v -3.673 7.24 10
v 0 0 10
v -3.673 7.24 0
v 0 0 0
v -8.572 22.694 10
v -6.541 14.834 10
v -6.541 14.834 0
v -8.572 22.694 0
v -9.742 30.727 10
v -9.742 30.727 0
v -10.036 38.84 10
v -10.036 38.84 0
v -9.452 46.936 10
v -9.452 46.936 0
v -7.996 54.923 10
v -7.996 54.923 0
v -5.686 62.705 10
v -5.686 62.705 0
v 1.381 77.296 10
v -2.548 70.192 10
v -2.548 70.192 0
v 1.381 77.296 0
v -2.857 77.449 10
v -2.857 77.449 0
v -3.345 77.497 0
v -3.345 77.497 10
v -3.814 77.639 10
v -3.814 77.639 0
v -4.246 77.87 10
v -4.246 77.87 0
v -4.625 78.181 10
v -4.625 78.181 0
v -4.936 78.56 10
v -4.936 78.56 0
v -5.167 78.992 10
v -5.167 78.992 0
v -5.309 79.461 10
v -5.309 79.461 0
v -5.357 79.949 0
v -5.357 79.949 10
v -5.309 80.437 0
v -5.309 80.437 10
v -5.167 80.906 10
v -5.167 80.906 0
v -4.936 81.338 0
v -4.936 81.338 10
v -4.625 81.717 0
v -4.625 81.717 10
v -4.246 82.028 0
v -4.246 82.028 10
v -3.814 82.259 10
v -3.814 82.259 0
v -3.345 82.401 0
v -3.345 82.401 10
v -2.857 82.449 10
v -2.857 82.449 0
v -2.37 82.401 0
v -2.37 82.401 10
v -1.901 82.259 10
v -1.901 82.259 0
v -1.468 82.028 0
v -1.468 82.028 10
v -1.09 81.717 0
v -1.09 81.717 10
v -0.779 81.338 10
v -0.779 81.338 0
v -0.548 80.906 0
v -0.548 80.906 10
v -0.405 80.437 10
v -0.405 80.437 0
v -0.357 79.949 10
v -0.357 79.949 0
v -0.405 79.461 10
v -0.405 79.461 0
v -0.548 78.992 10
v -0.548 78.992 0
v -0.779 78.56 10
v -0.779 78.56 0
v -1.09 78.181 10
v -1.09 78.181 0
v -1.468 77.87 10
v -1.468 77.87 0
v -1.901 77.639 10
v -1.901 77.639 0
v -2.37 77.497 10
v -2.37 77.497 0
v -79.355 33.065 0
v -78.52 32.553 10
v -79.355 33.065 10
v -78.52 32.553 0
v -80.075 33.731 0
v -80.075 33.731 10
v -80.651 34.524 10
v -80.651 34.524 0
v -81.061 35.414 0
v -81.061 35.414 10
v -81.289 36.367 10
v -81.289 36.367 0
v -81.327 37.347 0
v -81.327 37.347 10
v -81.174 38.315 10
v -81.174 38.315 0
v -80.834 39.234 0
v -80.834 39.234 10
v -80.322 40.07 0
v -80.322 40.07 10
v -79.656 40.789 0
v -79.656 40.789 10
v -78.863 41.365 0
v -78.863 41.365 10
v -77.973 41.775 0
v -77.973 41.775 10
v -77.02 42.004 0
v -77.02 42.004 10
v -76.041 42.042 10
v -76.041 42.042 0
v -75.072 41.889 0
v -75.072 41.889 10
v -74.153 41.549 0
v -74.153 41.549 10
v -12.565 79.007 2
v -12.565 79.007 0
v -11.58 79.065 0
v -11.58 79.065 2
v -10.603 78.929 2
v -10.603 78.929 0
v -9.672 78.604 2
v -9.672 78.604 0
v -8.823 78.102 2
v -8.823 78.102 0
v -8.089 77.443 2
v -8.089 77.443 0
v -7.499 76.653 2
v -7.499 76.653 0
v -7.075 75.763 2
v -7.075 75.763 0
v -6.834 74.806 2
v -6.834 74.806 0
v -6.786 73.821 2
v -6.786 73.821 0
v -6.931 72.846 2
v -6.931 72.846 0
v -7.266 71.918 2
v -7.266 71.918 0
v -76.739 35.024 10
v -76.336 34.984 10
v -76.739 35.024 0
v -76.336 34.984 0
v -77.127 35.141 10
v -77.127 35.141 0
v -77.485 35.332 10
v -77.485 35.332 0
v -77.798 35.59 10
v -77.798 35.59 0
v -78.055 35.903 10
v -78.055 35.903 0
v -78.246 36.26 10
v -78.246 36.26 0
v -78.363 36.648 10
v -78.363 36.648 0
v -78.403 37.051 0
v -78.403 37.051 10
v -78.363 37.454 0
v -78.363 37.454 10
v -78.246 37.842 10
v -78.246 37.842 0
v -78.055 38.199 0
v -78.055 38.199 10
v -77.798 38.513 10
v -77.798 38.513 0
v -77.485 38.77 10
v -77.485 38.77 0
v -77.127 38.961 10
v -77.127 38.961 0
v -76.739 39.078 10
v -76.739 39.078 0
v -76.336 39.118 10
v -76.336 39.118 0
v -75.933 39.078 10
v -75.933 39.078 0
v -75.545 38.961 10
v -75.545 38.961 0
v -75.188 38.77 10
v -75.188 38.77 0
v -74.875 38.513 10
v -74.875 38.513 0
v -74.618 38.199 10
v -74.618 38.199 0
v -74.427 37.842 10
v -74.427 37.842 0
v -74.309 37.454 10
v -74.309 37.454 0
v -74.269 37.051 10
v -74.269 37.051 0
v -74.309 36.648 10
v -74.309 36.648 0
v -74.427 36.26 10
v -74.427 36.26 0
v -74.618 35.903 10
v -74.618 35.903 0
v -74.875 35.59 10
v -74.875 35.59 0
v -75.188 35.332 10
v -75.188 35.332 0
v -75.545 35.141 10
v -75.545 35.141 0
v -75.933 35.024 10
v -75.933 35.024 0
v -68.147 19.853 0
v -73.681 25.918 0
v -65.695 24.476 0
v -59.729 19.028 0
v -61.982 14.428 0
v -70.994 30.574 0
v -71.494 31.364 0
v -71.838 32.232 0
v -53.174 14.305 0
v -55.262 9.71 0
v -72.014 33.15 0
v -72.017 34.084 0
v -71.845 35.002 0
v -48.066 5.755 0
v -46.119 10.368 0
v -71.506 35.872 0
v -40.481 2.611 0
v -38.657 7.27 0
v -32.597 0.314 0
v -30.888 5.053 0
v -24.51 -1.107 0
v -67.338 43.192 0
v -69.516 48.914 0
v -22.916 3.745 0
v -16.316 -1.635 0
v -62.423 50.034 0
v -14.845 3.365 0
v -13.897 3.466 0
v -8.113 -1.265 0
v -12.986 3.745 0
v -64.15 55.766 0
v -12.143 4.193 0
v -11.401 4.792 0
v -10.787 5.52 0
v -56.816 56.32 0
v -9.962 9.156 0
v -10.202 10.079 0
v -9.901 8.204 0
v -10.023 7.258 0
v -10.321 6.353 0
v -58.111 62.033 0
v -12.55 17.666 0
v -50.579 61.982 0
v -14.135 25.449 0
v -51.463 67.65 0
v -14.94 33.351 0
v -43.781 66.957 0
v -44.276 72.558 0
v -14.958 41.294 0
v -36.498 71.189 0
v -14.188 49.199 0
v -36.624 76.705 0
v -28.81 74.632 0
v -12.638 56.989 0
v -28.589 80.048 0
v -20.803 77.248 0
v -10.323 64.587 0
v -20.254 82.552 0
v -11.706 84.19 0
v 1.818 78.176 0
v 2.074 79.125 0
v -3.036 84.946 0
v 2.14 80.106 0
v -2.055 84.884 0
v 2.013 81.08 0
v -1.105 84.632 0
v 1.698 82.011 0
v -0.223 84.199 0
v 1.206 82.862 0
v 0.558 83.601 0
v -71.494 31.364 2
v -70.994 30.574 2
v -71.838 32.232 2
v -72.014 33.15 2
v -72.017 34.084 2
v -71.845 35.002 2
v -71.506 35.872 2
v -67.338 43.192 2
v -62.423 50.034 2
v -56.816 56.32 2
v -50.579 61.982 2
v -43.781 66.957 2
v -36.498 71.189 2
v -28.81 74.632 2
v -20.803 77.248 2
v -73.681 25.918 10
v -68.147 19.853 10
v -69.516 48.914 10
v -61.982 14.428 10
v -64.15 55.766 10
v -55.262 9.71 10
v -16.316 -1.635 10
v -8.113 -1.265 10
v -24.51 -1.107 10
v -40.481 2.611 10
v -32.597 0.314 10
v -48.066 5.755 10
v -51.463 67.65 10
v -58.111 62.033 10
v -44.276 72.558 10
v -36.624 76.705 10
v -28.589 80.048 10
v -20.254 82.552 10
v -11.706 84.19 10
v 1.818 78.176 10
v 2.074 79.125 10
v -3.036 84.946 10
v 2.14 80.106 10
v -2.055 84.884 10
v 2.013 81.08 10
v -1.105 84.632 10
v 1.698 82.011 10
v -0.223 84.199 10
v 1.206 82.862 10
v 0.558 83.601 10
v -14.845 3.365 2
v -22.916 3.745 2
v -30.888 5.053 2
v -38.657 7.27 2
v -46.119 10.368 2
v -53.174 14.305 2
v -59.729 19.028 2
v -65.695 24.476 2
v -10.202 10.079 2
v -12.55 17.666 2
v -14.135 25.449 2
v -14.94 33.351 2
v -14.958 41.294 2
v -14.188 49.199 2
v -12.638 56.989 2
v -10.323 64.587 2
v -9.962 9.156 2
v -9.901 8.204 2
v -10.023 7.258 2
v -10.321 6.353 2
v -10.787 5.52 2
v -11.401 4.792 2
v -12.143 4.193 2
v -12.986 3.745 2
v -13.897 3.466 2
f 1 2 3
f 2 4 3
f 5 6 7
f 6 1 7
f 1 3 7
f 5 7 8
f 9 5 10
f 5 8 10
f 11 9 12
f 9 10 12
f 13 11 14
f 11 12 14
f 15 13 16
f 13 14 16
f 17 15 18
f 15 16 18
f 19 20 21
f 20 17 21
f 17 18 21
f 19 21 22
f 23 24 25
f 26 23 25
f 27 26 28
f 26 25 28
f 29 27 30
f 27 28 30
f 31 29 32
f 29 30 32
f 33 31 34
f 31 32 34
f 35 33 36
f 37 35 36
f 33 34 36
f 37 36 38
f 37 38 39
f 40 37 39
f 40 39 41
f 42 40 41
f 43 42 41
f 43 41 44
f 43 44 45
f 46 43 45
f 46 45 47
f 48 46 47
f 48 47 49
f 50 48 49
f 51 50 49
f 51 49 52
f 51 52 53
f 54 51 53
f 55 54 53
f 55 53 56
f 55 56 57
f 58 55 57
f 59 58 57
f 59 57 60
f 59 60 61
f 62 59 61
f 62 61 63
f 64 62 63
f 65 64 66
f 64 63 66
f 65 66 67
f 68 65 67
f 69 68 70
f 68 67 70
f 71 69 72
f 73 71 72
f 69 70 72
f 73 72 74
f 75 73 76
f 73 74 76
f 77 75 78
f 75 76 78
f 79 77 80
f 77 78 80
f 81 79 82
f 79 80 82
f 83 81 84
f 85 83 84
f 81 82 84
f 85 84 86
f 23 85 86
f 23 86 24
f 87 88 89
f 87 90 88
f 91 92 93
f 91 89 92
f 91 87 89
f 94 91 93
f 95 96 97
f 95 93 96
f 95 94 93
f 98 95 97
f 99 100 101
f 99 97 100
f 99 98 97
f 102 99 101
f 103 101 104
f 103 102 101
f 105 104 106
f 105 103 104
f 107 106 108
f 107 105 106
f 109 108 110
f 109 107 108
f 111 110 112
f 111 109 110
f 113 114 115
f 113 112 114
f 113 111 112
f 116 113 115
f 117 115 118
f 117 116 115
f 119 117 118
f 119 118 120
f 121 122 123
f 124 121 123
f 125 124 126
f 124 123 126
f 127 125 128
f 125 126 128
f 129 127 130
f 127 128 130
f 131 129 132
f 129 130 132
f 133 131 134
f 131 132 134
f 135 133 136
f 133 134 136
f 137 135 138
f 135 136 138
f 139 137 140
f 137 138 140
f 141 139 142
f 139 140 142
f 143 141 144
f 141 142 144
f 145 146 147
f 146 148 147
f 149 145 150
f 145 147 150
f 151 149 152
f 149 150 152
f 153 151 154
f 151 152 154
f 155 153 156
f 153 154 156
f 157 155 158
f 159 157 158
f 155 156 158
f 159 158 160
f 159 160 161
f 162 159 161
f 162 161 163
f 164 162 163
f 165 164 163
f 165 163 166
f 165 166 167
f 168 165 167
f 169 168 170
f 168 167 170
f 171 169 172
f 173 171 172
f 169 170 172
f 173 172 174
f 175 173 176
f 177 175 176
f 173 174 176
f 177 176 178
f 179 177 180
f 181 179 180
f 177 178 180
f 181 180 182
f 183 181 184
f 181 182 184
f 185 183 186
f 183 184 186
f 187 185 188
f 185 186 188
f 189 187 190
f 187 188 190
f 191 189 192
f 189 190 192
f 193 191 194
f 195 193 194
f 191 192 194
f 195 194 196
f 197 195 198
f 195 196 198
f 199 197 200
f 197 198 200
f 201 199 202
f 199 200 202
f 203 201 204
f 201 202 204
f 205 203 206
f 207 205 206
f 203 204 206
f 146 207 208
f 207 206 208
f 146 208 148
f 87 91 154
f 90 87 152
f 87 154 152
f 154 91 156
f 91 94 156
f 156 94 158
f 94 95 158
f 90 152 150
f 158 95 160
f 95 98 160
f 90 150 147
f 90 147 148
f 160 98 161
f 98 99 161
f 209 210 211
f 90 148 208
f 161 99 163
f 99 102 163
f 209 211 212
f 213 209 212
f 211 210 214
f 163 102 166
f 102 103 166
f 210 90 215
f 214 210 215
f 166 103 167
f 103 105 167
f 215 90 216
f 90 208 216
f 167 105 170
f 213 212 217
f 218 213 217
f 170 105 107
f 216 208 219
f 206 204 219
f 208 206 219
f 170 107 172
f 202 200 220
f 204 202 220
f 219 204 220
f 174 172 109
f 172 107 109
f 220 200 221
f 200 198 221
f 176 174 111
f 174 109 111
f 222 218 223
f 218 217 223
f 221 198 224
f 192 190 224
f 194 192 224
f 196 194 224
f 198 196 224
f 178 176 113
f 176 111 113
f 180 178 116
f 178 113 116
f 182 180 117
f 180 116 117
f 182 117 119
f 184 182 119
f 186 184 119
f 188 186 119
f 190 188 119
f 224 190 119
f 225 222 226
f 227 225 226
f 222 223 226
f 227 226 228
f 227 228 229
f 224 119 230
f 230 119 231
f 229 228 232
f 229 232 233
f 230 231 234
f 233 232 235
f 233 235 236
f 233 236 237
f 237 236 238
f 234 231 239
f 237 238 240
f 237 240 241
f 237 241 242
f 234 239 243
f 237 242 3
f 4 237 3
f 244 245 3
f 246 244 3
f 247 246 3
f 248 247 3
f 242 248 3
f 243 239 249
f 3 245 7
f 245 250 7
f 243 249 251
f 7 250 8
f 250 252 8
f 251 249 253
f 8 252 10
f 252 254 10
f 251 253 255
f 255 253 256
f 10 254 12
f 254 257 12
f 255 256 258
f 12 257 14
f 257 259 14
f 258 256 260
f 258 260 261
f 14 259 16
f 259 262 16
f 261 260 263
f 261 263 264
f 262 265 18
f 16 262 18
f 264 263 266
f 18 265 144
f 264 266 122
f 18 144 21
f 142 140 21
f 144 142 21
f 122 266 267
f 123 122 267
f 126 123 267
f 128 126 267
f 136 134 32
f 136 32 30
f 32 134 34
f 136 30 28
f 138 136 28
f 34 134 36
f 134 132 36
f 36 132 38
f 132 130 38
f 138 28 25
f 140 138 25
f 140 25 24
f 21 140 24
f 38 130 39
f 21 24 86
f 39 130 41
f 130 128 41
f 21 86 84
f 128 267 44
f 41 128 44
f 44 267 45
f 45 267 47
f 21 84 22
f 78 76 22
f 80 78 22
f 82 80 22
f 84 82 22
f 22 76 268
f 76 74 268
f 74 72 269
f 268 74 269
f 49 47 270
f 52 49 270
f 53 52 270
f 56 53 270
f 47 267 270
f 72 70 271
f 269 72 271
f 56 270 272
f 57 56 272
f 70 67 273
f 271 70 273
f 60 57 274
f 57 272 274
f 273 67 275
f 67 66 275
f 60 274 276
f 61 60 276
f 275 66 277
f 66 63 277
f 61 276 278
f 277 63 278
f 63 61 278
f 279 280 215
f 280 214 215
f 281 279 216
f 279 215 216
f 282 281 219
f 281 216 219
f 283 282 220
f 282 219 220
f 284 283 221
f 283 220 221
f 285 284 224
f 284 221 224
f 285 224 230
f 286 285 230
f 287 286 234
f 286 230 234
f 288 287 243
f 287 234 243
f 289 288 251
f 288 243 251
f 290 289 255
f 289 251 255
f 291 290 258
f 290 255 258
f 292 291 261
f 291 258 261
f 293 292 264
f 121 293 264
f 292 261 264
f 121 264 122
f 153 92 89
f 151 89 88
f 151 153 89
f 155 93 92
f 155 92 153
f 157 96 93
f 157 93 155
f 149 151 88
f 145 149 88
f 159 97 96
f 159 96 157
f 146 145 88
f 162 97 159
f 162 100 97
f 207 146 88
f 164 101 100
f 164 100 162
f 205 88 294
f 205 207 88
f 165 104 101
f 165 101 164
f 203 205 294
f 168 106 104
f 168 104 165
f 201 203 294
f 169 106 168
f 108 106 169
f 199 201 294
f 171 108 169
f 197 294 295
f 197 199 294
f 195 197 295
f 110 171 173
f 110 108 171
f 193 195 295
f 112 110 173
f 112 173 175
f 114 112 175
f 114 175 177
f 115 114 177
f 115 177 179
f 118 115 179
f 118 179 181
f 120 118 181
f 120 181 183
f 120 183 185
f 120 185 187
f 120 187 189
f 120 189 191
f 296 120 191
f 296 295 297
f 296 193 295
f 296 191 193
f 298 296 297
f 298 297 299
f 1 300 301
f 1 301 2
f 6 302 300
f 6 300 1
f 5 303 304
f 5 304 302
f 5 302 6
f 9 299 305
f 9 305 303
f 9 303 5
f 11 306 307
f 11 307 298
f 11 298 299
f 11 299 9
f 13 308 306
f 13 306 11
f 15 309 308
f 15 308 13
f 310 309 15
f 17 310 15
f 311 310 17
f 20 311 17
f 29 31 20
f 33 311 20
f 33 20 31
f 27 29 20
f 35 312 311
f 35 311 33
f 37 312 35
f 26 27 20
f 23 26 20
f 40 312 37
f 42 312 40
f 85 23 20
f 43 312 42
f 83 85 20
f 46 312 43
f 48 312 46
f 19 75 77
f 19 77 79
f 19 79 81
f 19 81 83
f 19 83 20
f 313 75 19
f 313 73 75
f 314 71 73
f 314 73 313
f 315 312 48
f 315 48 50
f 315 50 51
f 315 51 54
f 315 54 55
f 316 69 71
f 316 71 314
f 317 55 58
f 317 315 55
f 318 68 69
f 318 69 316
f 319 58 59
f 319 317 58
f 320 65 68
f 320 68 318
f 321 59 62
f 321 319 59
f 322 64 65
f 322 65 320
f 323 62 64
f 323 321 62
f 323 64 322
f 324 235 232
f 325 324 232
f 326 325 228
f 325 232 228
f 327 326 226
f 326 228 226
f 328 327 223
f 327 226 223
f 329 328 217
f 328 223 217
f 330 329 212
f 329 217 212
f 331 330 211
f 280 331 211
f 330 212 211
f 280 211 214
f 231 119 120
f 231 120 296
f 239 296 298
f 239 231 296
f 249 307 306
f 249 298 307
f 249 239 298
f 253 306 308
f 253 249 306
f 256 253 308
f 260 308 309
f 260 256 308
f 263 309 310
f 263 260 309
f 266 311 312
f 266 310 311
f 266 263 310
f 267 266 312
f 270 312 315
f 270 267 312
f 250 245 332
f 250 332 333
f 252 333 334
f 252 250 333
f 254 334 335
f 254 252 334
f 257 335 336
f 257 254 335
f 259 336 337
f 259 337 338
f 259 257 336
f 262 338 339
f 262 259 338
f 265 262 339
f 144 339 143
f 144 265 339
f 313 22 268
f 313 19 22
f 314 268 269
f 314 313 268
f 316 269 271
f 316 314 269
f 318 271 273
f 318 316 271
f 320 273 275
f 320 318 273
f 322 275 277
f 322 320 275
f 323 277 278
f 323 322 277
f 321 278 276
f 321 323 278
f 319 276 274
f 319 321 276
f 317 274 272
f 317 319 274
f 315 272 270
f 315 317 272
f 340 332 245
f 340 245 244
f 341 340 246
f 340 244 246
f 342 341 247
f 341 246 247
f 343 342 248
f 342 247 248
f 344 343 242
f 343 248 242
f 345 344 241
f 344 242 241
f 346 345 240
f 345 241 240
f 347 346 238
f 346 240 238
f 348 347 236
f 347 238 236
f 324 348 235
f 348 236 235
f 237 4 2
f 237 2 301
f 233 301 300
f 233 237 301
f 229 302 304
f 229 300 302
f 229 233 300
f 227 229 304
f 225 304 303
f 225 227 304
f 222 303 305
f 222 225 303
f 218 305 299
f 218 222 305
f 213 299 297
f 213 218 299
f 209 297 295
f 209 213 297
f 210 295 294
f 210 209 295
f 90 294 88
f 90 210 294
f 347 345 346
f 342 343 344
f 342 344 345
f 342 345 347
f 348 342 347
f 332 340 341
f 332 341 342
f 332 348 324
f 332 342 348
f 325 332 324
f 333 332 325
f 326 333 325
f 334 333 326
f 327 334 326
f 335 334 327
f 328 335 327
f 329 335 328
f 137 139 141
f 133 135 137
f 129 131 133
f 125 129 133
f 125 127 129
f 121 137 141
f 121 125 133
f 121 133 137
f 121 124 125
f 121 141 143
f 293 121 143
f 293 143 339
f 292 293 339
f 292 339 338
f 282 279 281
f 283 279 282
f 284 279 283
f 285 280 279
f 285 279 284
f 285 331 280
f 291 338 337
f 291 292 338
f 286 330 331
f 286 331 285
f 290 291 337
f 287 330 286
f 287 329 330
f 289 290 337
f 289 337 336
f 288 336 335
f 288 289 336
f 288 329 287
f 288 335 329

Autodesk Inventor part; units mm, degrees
ref_plane "YZ Plane" through (0, 0, 0) normal (1, 0, 0) x (0, 1, 0)
ref_plane "XZ Plane" through (0, 0, 0) normal (0, 1, 0) x (-1, 0, 0)
ref_plane "XY Plane" through (0, 0, 0) normal (0, 0, 1) x (1, 0, 0)
sketch "Sketch1" plane through (0, 0, 0) normal (0, 0, 1) x (1, 0, 0)
  circle A0 centre (0, 0) radius 75 construction
  arc A1 (-78.5195, 32.5529) -> (0, 0) centre (-15.5934, 73.3611) ccw
  line L0 (-15.5934, 73.3611) -> (-78.5195, 32.5529) construction
  line L1 (-15.5934, 73.3611) -> (0, 0) construction
  line L2 (0, 0) -> (64.9519, 37.5) construction
  arc A2 (6.6958, 84.7359) -> (0, 0) centre (64.9519, 37.5) ccw
  line L3 (64.9519, 37.5) -> (6.6958, 84.7359) construction
  line L4 (64.9519, 37.5) -> (0, 0) construction
  line L5 (0, 0) -> (0, 75) construction
  circle A3 centre (0, 0) radius 85 construction
  arc A4 (6.6958, 84.7359) -> (-78.5195, 32.5529) centre (0, 0) ccw
  arc A5 (-74.153, 41.5492) -> (-78.5195, 32.5529) centre (-76.3362, 37.0511) ccw
  line L6 (-76.3362, 37.0511) -> (-78.5195, 32.5529) construction
  line L7 (-76.3362, 37.0511) -> (-74.153, 41.5492) construction
  point P0 (0, 0)
  dimension "d1" = 72
  dimension "d4" = 60
  dimension "d21" = 170
  dimension "d39" = 5
  dimension "d40" = 180
extrude "Extrusion1" add sketch "Sketch1" along normal blind 10
sketch "Sketch3" plane through (0, 0, 10) normal (0, 0, 1) x (1, 0, 0)
  circle A0 centre (0, 0) radius 80 construction
  circle A1 centre (64.9519, 37.5) radius 75 projected
  circle A2 centre (64.9519, 37.5) radius 80 construction
  point P0 (0, 0)
  point P1 (-2.8573, 79.949)
  dimension "d25" = 160
  dimension "d26" = 160
hole "Hole2" at (-2.8573, 79.949, 10) direction (0, 0, -1) diameter 5 end through all
sketch "Sketch4" plane through (0, 0, 10) normal (0, 0, 1) x (1, 0, 0)
  circle A0 centre (-2.8573, 79.949) radius 2.5 projected
  arc A1 (-78.5195, 32.5529) -> (0, 0) centre (-15.5934, 73.3611) ccw projected
  arc A2 (6.6958, 84.7359) -> (1.3808, 77.2959) centre (64.9519, 37.5) ccw
  arc A3 (6.6958, 84.7359) -> (-3.0359, 84.9458) centre (0, 0) ccw
  arc A4 (6.6958, 84.7359) -> (0, 0) centre (64.9519, 37.5) ccw projected
  arc A5 (6.6958, 84.7359) -> (-78.5195, 32.5529) centre (0, 0) ccw projected
  circle A6 centre (-2.8573, 79.949) radius 5
extrude "Extrusion2" cut sketch "Sketch4" against normal blind 10 contours A3 A2 A6
sketch "Sketch5" plane through (0, 0, 10) normal (0, 0, 1) x (1, 0, 0)
  arc A0 (1.3808, 77.2959) -> (-3.0359, 84.9458) centre (-2.8573, 79.949) ccw projected
  arc A1 (-3.0359, 84.9458) -> (-74.153, 41.5492) centre (0, 0) ccw projected
  arc A2 (-74.153, 41.5492) -> (-78.5195, 32.5529) centre (-76.3362, 37.0511) ccw projected
  arc A3 (-78.5195, 32.5529) -> (0, 0) centre (-15.5934, 73.3611) ccw projected
  arc A4 (1.3808, 77.2959) -> (0, 0) centre (64.9519, 37.5) ccw projected
  circle A5 centre (-2.8573, 79.949) radius 2.5 projected
  point P0 (0, 0)
hole "Hole3" at (-76.3362, 37.0511, 10) direction (0, 0, -1) diameter 4.134 end through all thread size "M5x0.8" class "6H" standard "ANSI Metric M Profile"
sketch "Sketch7" plane through (0, 0, 0) normal (0, 0, -1) x (-1, 0, 0)
  circle A0 centre (76.3362, 37.0511) radius 2.067 projected
  arc A1 (3.0359, 84.9458) -> (-1.3808, 77.2959) centre (2.8573, 79.949) ccw projected
  arc A2 (0, 0) -> (-1.3808, 77.2959) centre (-64.9519, 37.5) ccw projected
  arc A3 (0, 0) -> (78.5195, 32.5529) centre (15.5934, 73.3611) ccw projected
  arc A4 (78.5195, 32.5529) -> (74.153, 41.5492) centre (76.3362, 37.0511) ccw projected
  arc A5 (74.153, 41.5492) -> (3.0359, 84.9458) centre (0, 0) ccw projected
  circle A6 centre (2.8573, 79.949) radius 2.5 projected
  arc A7 (71.5064, 35.8724) -> (12.5647, 79.0071) centre (0, 0) ccw
  arc A8 (14.8454, 3.3651) -> (70.9945, 30.5742) centre (15.5934, 73.3611) ccw
  arc A9 (10.2017, 10.0786) -> (7.2658, 71.9181) centre (-64.9519, 37.5) ccw
  arc A10 (10.2017, 10.0786) -> (14.8454, 3.3651) centre (14.8988, 8.3648) ccw
  arc A11 (12.5647, 79.0071) -> (7.2658, 71.9181) centre (11.7794, 74.0692) ccw
  arc A12 (70.9945, 30.5742) -> (71.5064, 35.8724) centre (67.0373, 33.6304) ccw
  point P0 (0, 0)
  dimension "d51" = 5
  dimension "d55" = 5
extrude "Extrusion4" cut sketch "Sketch7" against normal blind 2 contours A12 A8 A10 A9 A11 A7
properties part number "blad"
